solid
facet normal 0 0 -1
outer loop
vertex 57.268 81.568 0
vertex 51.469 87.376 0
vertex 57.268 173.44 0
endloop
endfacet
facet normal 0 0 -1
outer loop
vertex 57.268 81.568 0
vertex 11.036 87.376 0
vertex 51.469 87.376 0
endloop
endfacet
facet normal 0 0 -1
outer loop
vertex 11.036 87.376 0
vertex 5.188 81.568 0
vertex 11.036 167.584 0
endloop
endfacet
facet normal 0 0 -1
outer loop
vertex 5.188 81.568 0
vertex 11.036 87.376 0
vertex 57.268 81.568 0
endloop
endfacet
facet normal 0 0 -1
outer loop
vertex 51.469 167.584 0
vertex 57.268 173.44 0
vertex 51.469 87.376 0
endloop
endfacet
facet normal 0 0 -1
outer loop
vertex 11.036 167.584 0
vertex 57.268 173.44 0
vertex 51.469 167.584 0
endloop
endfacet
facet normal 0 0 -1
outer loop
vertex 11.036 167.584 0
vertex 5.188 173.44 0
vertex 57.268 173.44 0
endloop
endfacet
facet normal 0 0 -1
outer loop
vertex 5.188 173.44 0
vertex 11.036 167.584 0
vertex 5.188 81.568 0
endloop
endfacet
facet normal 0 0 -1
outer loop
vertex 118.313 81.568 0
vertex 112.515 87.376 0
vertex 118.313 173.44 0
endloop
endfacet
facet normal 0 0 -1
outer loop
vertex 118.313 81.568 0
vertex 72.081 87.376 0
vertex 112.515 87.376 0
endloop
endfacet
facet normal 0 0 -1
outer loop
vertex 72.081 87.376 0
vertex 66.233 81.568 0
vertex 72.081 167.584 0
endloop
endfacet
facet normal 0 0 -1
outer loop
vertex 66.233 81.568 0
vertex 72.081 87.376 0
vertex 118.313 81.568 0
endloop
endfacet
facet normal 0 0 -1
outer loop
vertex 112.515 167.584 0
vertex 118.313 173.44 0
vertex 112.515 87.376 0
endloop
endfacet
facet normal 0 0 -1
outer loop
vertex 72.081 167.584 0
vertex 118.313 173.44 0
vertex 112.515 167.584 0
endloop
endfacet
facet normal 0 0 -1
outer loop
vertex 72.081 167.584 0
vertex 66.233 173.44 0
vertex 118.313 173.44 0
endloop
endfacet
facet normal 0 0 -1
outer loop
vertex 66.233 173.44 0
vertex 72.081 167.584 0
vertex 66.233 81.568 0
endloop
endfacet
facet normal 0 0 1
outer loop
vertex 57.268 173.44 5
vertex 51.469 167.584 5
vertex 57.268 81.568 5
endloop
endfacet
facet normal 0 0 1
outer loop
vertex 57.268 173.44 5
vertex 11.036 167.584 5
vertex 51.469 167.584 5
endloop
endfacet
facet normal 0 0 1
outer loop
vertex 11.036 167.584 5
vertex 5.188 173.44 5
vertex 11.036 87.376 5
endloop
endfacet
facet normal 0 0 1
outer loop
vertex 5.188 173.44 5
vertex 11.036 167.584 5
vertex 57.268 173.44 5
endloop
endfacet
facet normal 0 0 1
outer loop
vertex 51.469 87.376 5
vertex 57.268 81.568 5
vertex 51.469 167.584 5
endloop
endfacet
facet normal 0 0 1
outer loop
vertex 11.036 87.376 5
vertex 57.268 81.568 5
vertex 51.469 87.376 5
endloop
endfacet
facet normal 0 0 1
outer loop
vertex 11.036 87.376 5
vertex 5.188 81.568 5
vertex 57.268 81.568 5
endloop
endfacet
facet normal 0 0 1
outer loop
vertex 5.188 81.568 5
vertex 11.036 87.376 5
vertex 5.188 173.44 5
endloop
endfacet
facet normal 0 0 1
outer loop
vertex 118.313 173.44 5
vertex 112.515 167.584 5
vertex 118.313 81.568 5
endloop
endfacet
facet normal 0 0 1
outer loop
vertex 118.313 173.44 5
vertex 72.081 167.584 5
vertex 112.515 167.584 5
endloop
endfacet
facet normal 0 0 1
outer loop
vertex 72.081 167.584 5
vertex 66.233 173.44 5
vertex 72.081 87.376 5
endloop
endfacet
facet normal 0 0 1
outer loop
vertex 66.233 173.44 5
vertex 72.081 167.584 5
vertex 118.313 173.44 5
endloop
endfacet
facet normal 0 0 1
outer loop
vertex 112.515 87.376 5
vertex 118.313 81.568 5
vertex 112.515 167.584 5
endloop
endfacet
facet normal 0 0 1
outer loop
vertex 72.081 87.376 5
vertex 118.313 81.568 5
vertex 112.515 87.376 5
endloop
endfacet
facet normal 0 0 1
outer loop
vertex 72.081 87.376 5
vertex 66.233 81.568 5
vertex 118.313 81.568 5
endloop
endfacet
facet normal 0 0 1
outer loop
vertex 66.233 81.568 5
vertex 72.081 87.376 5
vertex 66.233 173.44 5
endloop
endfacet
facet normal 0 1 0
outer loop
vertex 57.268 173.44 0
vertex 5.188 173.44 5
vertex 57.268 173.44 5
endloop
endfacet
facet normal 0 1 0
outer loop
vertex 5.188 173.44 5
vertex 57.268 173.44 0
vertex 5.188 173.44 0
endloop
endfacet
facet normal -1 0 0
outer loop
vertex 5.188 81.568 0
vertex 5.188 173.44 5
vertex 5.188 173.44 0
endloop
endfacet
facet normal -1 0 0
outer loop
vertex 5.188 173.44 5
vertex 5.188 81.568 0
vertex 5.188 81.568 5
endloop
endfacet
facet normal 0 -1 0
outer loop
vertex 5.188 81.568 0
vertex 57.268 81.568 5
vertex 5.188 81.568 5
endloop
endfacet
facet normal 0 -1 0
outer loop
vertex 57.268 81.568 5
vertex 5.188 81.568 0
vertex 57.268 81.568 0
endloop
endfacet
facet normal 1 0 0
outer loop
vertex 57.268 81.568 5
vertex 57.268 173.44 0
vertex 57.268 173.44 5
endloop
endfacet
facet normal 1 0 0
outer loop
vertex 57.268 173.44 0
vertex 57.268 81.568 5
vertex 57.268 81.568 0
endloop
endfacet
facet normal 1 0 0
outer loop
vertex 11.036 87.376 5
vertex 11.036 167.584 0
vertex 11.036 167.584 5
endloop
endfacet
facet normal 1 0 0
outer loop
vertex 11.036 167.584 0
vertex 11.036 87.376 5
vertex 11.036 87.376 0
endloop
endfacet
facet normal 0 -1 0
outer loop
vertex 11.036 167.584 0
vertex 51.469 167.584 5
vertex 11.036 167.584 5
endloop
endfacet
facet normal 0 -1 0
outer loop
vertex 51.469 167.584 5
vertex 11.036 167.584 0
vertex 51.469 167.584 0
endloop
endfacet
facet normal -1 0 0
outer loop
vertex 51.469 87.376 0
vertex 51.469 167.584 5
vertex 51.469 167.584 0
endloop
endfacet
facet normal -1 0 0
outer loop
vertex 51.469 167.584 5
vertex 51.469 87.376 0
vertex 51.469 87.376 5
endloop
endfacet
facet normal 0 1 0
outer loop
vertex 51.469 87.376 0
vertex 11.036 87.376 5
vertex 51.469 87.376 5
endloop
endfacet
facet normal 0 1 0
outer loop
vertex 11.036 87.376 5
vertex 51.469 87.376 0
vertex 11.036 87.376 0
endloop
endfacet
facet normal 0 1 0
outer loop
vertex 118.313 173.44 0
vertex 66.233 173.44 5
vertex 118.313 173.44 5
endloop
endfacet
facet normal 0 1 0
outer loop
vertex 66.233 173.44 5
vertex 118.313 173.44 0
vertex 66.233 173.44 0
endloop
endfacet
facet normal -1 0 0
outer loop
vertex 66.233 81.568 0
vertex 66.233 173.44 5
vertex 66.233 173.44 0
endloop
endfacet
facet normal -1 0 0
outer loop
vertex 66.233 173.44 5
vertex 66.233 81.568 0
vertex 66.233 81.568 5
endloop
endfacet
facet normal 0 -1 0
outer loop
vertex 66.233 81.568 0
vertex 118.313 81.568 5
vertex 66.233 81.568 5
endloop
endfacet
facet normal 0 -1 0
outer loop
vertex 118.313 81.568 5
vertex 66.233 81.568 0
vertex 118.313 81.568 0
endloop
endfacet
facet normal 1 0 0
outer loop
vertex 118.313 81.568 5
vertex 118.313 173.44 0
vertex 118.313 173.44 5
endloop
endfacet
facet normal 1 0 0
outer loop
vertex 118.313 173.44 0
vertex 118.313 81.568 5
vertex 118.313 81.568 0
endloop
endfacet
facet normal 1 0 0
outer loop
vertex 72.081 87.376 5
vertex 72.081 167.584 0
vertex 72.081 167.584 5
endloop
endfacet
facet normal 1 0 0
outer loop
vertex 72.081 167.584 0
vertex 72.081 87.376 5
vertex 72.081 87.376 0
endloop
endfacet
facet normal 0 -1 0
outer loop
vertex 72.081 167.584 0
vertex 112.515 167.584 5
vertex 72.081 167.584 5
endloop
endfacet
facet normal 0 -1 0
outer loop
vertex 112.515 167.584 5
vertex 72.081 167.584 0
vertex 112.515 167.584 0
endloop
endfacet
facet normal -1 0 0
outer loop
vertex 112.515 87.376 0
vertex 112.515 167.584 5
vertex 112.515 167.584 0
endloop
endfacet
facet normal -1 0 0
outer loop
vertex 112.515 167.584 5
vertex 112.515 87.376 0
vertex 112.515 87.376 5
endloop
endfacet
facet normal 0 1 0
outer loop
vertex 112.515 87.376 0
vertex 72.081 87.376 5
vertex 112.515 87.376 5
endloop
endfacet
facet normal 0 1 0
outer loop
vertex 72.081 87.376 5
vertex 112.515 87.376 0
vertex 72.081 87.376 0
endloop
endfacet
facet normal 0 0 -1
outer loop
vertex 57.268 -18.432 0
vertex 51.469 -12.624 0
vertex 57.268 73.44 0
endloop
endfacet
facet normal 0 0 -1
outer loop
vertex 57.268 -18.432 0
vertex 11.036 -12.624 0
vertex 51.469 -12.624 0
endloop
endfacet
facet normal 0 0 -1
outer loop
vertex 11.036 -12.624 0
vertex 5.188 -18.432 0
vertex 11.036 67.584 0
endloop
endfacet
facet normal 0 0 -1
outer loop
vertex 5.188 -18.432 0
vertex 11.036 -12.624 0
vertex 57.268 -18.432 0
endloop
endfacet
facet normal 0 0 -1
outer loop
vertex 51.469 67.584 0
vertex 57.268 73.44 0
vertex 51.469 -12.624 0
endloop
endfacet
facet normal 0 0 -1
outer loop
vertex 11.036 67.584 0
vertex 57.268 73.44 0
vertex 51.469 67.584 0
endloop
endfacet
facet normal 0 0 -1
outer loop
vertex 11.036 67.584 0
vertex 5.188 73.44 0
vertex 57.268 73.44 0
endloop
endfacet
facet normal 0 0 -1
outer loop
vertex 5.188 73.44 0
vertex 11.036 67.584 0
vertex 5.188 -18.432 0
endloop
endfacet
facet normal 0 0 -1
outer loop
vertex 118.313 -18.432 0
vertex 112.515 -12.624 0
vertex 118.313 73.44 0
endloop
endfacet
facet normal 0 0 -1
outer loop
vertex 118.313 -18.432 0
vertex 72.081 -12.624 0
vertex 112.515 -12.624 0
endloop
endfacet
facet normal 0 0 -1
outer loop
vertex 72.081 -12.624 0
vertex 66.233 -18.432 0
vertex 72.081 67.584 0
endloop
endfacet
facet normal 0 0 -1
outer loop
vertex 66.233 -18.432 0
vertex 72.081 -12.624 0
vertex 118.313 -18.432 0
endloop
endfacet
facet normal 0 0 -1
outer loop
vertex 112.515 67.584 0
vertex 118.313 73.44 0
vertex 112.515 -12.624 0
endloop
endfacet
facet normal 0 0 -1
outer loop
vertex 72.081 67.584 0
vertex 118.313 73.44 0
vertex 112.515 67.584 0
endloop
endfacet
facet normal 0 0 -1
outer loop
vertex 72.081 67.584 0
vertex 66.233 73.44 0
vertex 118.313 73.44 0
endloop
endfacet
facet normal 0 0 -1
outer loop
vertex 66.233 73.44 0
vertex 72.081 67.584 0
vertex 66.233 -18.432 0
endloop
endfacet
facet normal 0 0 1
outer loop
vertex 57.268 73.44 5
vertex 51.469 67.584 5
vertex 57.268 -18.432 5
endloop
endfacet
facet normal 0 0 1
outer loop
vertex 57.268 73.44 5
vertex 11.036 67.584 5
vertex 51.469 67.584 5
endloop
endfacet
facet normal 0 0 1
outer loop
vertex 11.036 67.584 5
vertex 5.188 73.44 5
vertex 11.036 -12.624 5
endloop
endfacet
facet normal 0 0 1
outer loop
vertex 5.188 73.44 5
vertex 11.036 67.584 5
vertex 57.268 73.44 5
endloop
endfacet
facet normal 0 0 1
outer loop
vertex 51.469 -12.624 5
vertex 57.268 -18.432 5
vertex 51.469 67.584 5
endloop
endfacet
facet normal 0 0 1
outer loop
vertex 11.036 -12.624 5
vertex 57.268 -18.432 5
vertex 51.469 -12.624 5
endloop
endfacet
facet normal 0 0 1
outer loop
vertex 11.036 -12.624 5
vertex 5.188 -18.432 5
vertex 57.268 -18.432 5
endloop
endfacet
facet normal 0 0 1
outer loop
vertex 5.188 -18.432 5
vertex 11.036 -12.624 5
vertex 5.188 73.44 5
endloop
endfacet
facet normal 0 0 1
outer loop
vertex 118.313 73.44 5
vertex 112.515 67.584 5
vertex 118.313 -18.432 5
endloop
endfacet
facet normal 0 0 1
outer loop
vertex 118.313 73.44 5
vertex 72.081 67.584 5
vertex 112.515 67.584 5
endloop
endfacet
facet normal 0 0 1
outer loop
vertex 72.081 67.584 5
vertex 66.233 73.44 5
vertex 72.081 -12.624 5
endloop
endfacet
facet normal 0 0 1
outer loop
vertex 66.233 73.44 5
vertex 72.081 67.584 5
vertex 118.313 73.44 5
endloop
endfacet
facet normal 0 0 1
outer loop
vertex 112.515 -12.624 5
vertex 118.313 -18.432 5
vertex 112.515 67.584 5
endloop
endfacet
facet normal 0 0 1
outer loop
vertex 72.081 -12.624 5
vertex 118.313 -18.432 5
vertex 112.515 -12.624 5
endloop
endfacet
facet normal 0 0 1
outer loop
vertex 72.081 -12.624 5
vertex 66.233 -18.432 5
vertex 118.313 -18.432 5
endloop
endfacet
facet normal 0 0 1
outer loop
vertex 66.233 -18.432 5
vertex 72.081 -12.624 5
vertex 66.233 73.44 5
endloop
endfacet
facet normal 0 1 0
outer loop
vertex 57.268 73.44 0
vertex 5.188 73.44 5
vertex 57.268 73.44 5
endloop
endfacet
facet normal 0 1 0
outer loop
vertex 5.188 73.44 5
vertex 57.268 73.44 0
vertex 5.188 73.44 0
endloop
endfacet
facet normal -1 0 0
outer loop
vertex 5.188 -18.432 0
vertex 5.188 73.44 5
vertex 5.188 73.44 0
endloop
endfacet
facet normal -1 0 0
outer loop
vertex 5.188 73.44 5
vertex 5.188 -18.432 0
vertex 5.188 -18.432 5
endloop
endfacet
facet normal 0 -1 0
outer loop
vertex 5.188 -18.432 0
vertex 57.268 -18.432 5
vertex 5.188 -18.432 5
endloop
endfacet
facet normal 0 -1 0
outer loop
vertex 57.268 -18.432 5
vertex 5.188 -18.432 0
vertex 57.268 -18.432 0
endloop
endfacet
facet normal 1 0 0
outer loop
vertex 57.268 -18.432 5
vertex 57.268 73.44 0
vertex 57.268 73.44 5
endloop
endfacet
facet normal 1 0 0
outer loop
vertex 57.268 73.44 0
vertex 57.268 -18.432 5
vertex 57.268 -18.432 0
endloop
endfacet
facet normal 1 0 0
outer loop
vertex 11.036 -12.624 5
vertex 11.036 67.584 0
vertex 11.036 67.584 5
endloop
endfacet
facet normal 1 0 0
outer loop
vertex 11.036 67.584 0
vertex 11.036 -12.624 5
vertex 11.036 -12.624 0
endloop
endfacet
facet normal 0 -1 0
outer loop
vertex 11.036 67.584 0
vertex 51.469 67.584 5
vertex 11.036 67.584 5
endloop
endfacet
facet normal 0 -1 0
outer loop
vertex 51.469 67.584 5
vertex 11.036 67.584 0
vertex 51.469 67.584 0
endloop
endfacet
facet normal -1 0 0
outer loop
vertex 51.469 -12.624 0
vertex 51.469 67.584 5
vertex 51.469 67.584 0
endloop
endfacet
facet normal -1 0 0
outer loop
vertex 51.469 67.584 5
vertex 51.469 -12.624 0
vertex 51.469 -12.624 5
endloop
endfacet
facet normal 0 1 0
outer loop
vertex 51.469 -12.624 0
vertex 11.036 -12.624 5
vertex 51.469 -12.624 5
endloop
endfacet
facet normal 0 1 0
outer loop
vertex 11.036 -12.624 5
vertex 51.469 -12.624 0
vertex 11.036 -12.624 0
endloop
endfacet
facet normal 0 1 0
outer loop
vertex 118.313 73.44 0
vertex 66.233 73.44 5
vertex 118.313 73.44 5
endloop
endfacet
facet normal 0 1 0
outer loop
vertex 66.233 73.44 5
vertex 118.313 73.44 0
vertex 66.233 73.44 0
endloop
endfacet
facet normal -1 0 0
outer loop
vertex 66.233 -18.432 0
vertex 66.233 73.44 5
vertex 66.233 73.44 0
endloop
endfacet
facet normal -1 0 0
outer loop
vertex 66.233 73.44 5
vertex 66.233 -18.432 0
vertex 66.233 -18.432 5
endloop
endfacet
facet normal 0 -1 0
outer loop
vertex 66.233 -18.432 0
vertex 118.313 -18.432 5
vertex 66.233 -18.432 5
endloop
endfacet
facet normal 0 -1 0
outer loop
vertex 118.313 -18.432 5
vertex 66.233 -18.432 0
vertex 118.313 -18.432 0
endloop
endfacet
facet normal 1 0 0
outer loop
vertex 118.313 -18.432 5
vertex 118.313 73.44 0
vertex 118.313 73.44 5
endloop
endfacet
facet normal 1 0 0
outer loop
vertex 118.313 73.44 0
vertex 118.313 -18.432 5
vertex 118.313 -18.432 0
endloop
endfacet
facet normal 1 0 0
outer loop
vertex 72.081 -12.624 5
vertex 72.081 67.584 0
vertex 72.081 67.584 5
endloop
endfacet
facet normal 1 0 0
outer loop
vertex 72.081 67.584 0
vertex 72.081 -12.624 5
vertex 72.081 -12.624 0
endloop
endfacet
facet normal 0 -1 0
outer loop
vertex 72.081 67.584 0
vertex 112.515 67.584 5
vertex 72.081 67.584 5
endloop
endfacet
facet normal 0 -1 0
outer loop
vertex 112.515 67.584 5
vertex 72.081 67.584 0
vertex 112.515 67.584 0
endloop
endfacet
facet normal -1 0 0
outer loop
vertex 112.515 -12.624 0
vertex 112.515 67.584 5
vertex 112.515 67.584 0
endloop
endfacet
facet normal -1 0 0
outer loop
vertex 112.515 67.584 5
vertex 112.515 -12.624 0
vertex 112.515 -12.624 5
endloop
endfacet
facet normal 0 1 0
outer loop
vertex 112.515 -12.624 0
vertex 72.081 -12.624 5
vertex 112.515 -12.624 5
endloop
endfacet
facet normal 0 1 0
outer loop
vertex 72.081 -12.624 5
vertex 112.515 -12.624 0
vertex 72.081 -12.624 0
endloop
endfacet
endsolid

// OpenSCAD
// Team logo to be used with glued magnets


translate ([0,100,0]) linear_extrude(5) text("ぐで",font=".Aqua Kana:Bold", size=75);
linear_extrude(5) text("たま",font=".Aqua Kana:Bold", size=75);
